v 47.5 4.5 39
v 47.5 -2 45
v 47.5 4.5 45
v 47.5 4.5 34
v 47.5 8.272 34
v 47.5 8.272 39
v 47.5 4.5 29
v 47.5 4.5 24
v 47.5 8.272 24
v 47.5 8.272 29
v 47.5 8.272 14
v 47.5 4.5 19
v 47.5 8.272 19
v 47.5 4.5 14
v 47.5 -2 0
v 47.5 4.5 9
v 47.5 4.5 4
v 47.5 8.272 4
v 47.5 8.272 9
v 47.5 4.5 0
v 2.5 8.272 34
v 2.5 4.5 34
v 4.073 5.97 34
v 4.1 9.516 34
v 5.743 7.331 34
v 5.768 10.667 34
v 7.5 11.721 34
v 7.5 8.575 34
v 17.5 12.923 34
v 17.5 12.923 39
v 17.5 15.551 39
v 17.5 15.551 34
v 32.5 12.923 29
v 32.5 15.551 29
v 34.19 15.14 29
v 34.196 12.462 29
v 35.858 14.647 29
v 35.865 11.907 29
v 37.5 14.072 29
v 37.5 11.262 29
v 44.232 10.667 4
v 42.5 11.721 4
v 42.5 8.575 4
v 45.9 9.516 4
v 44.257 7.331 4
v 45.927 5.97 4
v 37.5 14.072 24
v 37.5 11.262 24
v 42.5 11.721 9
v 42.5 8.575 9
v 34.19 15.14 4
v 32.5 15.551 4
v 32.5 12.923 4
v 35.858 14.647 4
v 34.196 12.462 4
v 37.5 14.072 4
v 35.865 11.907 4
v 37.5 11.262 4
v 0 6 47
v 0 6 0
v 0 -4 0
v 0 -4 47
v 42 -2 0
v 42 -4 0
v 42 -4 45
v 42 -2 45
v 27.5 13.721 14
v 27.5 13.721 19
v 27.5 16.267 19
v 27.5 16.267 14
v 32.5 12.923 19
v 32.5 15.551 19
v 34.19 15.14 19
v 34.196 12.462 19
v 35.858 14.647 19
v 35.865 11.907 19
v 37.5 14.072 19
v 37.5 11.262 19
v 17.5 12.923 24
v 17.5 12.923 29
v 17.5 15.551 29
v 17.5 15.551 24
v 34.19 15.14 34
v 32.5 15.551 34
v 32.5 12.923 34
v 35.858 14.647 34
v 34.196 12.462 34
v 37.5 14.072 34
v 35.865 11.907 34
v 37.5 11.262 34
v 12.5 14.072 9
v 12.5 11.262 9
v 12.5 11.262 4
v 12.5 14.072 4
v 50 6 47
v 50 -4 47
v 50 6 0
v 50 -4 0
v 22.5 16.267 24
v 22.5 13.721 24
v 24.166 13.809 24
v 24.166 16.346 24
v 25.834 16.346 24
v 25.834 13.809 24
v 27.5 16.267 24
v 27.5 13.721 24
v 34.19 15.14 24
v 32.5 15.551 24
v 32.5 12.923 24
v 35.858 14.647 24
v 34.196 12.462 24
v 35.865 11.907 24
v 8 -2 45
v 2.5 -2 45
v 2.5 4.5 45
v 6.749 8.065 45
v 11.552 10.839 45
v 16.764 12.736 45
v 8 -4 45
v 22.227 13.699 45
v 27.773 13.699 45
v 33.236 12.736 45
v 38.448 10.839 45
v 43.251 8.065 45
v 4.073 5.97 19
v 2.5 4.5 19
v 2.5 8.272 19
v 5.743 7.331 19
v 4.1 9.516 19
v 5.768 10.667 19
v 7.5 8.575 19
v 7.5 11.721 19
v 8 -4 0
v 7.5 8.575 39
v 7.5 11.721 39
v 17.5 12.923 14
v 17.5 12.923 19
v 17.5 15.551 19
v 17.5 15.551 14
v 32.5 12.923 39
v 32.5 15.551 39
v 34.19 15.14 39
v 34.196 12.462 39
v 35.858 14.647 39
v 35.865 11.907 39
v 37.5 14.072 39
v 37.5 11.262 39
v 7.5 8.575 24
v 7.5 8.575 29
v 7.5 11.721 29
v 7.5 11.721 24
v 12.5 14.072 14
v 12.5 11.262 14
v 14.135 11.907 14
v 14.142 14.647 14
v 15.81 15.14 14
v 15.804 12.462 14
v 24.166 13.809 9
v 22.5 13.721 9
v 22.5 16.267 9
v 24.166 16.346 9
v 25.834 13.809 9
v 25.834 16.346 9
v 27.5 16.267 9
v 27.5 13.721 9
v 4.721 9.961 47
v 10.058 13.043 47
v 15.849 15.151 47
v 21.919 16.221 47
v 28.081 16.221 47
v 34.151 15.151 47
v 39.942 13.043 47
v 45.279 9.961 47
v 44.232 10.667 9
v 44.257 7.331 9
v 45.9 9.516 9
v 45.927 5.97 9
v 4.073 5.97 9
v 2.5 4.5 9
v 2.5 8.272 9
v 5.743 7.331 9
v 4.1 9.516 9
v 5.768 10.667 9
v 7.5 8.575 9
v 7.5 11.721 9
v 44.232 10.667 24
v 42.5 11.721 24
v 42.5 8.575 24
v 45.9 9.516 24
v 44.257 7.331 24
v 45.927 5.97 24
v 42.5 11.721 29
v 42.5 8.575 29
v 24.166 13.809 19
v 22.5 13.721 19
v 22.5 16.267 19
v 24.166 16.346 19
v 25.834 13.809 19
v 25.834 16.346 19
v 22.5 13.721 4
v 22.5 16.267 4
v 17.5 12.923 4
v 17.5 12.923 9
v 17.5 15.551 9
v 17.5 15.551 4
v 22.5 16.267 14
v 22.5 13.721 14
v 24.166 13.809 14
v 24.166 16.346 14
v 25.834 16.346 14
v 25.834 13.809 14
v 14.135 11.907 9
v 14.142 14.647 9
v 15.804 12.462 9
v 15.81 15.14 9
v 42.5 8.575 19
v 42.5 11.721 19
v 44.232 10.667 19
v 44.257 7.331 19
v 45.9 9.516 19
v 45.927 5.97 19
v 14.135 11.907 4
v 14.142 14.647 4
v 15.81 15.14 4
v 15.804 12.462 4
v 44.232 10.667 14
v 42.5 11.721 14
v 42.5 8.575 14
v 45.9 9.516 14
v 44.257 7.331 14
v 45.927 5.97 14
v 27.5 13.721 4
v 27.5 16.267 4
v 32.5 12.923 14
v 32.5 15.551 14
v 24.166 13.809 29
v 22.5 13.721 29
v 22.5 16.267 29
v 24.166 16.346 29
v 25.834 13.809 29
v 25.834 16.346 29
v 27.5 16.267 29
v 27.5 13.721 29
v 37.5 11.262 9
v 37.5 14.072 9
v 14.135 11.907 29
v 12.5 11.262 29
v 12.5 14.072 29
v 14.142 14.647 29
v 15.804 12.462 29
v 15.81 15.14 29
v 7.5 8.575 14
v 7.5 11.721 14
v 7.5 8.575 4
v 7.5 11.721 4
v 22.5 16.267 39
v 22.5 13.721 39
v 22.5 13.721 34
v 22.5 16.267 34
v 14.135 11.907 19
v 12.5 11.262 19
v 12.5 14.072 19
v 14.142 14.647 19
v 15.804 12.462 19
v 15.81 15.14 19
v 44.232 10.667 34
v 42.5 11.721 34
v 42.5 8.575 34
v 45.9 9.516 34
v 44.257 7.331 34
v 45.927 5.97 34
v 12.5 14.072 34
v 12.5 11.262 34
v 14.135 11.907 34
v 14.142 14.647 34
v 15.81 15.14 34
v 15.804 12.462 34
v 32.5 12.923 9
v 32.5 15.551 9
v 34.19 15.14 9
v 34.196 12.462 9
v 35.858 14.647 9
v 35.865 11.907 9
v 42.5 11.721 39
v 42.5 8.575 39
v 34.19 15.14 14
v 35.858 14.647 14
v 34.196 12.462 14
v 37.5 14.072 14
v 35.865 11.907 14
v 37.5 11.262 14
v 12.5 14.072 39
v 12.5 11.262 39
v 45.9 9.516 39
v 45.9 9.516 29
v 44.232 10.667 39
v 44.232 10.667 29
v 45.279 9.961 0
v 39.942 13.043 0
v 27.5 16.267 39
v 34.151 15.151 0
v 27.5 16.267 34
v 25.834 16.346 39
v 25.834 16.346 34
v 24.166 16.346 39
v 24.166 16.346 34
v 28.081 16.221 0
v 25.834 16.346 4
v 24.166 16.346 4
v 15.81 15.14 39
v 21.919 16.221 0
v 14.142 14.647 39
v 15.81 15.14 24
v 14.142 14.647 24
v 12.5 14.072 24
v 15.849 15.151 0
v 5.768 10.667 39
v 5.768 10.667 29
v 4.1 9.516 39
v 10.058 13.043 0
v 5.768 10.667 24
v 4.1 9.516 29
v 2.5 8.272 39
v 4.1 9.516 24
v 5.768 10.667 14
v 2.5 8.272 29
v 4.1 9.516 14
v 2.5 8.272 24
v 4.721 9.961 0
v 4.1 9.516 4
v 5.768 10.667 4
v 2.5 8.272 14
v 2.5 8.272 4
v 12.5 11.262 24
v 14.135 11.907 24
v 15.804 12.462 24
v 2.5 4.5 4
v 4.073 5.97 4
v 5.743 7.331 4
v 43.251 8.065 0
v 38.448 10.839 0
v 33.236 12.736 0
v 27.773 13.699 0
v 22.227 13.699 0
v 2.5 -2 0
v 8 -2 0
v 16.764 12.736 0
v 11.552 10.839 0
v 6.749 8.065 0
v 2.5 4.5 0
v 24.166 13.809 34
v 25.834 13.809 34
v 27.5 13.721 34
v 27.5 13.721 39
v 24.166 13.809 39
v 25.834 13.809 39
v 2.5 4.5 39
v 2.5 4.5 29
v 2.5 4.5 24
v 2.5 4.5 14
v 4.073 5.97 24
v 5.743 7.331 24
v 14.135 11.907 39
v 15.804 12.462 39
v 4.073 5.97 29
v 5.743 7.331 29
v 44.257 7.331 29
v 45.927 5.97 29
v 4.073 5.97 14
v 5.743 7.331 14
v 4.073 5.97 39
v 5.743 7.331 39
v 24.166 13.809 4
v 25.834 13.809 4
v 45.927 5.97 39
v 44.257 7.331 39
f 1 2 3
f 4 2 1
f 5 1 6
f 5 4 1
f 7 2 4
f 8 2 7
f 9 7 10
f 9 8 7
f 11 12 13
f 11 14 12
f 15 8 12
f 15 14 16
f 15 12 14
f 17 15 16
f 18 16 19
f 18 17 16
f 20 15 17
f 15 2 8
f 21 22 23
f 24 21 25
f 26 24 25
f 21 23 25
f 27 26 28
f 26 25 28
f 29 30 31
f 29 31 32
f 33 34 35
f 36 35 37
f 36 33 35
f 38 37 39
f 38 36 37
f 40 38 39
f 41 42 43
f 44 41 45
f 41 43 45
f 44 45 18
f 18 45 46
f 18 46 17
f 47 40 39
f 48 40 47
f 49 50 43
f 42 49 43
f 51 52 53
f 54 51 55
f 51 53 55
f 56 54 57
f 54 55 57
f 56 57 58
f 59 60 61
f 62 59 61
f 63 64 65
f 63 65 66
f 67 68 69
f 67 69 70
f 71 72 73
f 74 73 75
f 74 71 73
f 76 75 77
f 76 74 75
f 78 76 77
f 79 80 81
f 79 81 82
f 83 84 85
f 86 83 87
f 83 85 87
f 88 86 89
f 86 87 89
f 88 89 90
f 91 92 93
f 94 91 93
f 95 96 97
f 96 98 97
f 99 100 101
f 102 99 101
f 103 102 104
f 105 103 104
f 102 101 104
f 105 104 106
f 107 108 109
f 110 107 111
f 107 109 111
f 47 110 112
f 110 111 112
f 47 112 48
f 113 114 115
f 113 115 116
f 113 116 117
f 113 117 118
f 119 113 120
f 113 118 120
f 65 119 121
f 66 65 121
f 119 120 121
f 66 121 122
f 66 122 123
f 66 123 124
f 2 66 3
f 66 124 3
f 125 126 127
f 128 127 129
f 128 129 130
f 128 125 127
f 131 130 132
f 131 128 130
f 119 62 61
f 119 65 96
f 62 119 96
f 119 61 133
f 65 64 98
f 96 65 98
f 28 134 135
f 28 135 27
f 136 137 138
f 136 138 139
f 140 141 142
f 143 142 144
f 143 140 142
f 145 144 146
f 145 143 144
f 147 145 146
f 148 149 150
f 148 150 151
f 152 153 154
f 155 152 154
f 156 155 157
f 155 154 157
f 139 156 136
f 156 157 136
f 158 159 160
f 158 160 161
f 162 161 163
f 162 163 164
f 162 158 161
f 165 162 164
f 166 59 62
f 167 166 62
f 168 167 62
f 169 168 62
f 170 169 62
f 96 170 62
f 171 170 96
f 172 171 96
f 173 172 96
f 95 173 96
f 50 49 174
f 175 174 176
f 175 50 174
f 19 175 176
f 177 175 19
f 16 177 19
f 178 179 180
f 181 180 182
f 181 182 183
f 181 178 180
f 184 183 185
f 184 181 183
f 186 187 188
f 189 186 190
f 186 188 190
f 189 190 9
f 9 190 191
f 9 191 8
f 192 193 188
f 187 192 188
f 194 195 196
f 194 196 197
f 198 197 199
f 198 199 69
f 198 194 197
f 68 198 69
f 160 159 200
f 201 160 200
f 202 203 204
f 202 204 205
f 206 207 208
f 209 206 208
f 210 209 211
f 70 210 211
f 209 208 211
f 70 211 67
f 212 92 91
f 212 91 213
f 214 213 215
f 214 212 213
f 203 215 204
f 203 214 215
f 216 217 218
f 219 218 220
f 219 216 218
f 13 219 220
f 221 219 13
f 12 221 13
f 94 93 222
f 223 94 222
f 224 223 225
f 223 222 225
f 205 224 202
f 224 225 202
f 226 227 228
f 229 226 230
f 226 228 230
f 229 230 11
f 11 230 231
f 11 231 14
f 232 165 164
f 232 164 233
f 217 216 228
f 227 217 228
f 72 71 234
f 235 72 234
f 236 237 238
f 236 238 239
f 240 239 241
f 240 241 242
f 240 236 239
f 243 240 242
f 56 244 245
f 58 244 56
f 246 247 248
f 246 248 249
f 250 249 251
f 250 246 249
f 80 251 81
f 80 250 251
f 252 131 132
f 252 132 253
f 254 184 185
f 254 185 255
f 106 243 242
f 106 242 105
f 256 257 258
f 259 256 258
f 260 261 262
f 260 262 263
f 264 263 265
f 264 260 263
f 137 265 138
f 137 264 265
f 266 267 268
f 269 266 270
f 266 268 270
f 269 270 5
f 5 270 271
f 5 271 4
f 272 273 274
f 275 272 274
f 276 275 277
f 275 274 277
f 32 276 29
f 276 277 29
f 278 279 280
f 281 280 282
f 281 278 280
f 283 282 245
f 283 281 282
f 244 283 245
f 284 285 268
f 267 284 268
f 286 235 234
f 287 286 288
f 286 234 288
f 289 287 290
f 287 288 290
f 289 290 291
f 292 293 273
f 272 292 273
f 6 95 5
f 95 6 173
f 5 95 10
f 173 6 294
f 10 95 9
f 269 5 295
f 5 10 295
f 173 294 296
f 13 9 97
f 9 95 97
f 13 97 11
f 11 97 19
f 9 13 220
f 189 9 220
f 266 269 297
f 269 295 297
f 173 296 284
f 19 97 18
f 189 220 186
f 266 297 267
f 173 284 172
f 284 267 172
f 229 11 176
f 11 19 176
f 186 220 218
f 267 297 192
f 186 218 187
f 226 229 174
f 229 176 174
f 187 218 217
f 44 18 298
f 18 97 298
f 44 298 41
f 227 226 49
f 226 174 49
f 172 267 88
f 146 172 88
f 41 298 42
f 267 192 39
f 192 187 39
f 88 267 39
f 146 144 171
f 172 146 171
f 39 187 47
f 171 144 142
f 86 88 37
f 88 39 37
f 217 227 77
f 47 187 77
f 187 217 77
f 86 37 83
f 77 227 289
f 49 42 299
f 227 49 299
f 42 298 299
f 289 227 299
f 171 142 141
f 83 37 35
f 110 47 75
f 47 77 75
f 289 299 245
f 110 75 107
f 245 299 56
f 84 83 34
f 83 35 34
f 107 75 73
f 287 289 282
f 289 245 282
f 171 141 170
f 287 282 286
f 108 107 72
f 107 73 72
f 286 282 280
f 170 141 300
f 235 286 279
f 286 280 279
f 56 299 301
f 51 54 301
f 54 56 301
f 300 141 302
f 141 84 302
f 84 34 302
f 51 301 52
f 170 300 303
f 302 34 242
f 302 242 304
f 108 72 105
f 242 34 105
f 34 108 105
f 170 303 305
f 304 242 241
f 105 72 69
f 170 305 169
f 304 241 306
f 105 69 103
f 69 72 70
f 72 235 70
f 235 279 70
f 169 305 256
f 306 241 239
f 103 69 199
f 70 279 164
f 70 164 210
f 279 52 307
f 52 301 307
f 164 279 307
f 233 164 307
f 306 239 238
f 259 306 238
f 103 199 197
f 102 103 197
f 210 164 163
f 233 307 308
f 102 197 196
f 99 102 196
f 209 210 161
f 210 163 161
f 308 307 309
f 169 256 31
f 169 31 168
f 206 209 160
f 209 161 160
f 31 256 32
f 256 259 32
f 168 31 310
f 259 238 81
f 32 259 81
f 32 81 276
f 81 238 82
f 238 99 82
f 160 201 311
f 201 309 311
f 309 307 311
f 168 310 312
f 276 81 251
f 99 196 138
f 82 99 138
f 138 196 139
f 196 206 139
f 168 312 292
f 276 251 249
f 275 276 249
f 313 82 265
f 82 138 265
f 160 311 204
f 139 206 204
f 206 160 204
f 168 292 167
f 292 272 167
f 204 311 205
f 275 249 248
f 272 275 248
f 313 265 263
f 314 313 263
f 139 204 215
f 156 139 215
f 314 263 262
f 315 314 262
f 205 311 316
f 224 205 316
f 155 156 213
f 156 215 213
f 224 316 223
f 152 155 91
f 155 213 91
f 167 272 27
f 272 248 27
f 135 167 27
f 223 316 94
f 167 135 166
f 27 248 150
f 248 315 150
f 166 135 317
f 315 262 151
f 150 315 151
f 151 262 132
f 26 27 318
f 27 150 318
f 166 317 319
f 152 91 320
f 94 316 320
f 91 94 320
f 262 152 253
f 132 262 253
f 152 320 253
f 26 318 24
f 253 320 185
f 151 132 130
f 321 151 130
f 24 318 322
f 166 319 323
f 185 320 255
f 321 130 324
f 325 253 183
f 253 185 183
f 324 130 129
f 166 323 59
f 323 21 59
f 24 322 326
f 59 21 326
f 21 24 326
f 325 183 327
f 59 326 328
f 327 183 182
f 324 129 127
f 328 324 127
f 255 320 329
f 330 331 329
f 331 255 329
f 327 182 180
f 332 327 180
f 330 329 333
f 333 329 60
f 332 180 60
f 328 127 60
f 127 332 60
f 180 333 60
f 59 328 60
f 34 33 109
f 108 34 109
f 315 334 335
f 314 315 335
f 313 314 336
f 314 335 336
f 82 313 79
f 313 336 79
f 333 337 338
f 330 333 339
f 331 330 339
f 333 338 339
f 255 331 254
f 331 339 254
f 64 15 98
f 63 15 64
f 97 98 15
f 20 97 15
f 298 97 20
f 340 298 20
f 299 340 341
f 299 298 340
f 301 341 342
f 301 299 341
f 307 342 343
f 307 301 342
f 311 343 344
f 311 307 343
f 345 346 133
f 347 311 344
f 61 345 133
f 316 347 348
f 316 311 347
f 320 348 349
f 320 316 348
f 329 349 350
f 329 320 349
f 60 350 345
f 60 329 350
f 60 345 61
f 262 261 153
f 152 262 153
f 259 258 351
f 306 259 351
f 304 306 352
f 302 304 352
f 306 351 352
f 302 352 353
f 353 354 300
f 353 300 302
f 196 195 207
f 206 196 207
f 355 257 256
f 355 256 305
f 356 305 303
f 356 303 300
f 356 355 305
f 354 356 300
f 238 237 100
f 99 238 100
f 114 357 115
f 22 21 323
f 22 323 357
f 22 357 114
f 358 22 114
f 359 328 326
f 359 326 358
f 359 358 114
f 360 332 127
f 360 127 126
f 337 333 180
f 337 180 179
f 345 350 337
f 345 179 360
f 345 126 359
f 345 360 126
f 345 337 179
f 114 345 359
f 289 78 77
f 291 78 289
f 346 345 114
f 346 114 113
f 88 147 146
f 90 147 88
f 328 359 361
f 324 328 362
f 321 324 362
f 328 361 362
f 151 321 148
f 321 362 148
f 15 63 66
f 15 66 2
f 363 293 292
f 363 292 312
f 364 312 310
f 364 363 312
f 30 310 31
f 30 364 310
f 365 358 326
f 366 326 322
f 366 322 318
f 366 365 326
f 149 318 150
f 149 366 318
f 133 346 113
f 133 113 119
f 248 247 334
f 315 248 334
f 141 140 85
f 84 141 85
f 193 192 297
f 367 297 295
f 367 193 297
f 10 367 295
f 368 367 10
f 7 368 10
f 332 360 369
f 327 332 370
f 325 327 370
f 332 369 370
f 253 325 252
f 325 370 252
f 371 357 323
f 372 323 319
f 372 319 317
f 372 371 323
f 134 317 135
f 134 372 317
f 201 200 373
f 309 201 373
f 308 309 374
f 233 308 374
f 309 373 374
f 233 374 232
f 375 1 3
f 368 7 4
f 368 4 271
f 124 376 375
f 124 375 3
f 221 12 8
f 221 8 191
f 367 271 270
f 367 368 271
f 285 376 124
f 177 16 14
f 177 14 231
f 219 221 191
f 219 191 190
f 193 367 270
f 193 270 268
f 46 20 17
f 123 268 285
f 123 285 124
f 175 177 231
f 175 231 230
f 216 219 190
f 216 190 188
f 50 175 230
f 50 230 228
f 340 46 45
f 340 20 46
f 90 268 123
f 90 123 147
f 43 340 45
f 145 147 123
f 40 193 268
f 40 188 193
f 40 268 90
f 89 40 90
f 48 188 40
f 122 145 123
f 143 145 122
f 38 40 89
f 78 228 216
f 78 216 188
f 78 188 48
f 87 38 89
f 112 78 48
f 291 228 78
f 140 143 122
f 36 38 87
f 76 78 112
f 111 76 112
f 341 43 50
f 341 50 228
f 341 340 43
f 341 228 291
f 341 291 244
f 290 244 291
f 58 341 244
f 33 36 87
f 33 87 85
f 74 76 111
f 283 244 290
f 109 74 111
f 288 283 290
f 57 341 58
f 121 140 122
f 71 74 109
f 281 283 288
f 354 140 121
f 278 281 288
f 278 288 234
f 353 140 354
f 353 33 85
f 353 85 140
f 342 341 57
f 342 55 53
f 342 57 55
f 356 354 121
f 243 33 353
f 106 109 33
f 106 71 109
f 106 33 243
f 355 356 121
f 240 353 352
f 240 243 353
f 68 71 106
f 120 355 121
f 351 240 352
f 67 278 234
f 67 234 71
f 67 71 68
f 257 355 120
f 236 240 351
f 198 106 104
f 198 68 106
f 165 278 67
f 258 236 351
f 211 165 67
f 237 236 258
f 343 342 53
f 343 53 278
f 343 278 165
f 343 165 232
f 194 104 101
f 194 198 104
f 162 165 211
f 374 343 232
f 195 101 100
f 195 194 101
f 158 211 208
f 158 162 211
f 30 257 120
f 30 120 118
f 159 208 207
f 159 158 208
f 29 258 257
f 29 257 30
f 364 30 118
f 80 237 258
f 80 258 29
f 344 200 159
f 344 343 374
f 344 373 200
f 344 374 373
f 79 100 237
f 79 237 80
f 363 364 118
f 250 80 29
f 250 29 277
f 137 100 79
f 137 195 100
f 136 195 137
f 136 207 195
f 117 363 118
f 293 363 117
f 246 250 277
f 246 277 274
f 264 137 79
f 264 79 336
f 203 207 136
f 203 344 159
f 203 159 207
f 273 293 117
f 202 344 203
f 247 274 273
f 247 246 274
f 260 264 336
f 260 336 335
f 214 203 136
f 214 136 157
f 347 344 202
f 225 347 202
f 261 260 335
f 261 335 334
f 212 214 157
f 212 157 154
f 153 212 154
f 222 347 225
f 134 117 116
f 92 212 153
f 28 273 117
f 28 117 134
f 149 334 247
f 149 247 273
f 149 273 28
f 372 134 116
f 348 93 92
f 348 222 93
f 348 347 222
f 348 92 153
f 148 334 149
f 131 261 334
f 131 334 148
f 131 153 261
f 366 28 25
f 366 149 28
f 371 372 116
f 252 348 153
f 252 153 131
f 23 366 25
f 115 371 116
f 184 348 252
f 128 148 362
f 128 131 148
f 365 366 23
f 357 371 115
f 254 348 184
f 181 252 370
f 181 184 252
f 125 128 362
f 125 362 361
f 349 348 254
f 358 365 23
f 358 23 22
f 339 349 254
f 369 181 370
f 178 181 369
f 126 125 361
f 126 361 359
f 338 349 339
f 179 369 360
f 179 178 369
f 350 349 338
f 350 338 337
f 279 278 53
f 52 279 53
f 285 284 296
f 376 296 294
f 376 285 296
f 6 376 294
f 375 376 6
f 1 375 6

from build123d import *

# Parameters (mm, degrees)
EXTRUDE_1_DEPTH     = 45
EXTRUDE_2_DEPTH     = 2
SKETCH_5_W          = 5
SKETCH_5_H          = 5
CUT_EXTRUDE_1_DEPTH = 46


with BuildPart() as part:
    # Эскиз1 → Бобышка-Вытянуть1 (new body)
    with BuildSketch(Plane.XY):
        with BuildLine():
            Line((0, 0), (0, 6))
            ThreePointArc((0, 6), (25, 16.355339059), (50, 6))
            Line((50, 6), (50, 0))
            Line((50, 0), (50, -4))
            Line((50, -4), (42, -4))
            Line((42, -4), (42, -2))
            Line((42, -2), (47.5, -2))
            Line((47.5, -2), (47.5, 0))
            Line((47.5, 0), (47.5, 4.5))
            ThreePointArc((47.5, 4.5), (25, 13.819805153), (2.5, 4.5))
            Line((2.5, 4.5), (2.5, 0))
            Line((2.5, 0), (2.5, -2))
            Line((2.5, -2), (8, -2))
            Line((8, -2), (8, -4))
            Line((8, -4), (0, -4))
            Line((0, -4), (0, 0))
        make_face()
    extrude(amount=EXTRUDE_1_DEPTH)

    # Эскиз3 → Бобышка-Вытянуть2 (add)
    with BuildSketch(Plane.XY.offset(45)):
        with BuildLine():
            Line((0, -4), (50, -4))
            Line((50, -4), (50, 6))
            ThreePointArc((50, 6), (25, 16.355339059), (0, 6))
            Line((0, 6), (0, -4))
        make_face()
    extrude(amount=EXTRUDE_2_DEPTH)

    # Эскиз5 → Вырез-Вытянуть1 (cut)
    with BuildSketch(Plane(origin=(0, 4, 0), x_dir=(1, 0, 0), z_dir=(0, 1, 0))):
        with Locations((15, -6.5)):
            Rectangle(SKETCH_5_W, SKETCH_5_H)
        with Locations((5, -6.5)):
            Rectangle(SKETCH_5_W, SKETCH_5_H)
        with Locations((25, -6.5)):
            Rectangle(SKETCH_5_W, SKETCH_5_H)
        with Locations((35, -6.5)):
            Rectangle(SKETCH_5_W, SKETCH_5_H)
        with Locations((45, -6.5)):
            Rectangle(SKETCH_5_W, SKETCH_5_H)
        with Locations((15, -16.5)):
            Rectangle(SKETCH_5_W, SKETCH_5_H)
        with Locations((5, -16.5)):
            Rectangle(SKETCH_5_W, SKETCH_5_H)
        with Locations((25, -16.5)):
            Rectangle(SKETCH_5_W, SKETCH_5_H)
        with Locations((35, -16.5)):
            Rectangle(SKETCH_5_W, SKETCH_5_H)
        with Locations((45, -16.5)):
            Rectangle(SKETCH_5_W, SKETCH_5_H)
        with Locations((15, -26.5)):
            Rectangle(SKETCH_5_W, SKETCH_5_H)
        with Locations((5, -26.5)):
            Rectangle(SKETCH_5_W, SKETCH_5_H)
        with Locations((25, -26.5)):
            Rectangle(SKETCH_5_W, SKETCH_5_H)
        with Locations((35, -26.5)):
            Rectangle(SKETCH_5_W, SKETCH_5_H)
        with Locations((45, -26.5)):
            Rectangle(SKETCH_5_W, SKETCH_5_H)
        with Locations((15, -36.5)):
            Rectangle(SKETCH_5_W, SKETCH_5_H)
        with Locations((5, -36.5)):
            Rectangle(SKETCH_5_W, SKETCH_5_H)
        with Locations((25, -36.5)):
            Rectangle(SKETCH_5_W, SKETCH_5_H)
        with Locations((35, -36.5)):
            Rectangle(SKETCH_5_W, SKETCH_5_H)
        with Locations((45, -36.5)):
            Rectangle(SKETCH_5_W, SKETCH_5_H)
    extrude(amount=CUT_EXTRUDE_1_DEPTH, mode=Mode.SUBTRACT)


solid = part.part
